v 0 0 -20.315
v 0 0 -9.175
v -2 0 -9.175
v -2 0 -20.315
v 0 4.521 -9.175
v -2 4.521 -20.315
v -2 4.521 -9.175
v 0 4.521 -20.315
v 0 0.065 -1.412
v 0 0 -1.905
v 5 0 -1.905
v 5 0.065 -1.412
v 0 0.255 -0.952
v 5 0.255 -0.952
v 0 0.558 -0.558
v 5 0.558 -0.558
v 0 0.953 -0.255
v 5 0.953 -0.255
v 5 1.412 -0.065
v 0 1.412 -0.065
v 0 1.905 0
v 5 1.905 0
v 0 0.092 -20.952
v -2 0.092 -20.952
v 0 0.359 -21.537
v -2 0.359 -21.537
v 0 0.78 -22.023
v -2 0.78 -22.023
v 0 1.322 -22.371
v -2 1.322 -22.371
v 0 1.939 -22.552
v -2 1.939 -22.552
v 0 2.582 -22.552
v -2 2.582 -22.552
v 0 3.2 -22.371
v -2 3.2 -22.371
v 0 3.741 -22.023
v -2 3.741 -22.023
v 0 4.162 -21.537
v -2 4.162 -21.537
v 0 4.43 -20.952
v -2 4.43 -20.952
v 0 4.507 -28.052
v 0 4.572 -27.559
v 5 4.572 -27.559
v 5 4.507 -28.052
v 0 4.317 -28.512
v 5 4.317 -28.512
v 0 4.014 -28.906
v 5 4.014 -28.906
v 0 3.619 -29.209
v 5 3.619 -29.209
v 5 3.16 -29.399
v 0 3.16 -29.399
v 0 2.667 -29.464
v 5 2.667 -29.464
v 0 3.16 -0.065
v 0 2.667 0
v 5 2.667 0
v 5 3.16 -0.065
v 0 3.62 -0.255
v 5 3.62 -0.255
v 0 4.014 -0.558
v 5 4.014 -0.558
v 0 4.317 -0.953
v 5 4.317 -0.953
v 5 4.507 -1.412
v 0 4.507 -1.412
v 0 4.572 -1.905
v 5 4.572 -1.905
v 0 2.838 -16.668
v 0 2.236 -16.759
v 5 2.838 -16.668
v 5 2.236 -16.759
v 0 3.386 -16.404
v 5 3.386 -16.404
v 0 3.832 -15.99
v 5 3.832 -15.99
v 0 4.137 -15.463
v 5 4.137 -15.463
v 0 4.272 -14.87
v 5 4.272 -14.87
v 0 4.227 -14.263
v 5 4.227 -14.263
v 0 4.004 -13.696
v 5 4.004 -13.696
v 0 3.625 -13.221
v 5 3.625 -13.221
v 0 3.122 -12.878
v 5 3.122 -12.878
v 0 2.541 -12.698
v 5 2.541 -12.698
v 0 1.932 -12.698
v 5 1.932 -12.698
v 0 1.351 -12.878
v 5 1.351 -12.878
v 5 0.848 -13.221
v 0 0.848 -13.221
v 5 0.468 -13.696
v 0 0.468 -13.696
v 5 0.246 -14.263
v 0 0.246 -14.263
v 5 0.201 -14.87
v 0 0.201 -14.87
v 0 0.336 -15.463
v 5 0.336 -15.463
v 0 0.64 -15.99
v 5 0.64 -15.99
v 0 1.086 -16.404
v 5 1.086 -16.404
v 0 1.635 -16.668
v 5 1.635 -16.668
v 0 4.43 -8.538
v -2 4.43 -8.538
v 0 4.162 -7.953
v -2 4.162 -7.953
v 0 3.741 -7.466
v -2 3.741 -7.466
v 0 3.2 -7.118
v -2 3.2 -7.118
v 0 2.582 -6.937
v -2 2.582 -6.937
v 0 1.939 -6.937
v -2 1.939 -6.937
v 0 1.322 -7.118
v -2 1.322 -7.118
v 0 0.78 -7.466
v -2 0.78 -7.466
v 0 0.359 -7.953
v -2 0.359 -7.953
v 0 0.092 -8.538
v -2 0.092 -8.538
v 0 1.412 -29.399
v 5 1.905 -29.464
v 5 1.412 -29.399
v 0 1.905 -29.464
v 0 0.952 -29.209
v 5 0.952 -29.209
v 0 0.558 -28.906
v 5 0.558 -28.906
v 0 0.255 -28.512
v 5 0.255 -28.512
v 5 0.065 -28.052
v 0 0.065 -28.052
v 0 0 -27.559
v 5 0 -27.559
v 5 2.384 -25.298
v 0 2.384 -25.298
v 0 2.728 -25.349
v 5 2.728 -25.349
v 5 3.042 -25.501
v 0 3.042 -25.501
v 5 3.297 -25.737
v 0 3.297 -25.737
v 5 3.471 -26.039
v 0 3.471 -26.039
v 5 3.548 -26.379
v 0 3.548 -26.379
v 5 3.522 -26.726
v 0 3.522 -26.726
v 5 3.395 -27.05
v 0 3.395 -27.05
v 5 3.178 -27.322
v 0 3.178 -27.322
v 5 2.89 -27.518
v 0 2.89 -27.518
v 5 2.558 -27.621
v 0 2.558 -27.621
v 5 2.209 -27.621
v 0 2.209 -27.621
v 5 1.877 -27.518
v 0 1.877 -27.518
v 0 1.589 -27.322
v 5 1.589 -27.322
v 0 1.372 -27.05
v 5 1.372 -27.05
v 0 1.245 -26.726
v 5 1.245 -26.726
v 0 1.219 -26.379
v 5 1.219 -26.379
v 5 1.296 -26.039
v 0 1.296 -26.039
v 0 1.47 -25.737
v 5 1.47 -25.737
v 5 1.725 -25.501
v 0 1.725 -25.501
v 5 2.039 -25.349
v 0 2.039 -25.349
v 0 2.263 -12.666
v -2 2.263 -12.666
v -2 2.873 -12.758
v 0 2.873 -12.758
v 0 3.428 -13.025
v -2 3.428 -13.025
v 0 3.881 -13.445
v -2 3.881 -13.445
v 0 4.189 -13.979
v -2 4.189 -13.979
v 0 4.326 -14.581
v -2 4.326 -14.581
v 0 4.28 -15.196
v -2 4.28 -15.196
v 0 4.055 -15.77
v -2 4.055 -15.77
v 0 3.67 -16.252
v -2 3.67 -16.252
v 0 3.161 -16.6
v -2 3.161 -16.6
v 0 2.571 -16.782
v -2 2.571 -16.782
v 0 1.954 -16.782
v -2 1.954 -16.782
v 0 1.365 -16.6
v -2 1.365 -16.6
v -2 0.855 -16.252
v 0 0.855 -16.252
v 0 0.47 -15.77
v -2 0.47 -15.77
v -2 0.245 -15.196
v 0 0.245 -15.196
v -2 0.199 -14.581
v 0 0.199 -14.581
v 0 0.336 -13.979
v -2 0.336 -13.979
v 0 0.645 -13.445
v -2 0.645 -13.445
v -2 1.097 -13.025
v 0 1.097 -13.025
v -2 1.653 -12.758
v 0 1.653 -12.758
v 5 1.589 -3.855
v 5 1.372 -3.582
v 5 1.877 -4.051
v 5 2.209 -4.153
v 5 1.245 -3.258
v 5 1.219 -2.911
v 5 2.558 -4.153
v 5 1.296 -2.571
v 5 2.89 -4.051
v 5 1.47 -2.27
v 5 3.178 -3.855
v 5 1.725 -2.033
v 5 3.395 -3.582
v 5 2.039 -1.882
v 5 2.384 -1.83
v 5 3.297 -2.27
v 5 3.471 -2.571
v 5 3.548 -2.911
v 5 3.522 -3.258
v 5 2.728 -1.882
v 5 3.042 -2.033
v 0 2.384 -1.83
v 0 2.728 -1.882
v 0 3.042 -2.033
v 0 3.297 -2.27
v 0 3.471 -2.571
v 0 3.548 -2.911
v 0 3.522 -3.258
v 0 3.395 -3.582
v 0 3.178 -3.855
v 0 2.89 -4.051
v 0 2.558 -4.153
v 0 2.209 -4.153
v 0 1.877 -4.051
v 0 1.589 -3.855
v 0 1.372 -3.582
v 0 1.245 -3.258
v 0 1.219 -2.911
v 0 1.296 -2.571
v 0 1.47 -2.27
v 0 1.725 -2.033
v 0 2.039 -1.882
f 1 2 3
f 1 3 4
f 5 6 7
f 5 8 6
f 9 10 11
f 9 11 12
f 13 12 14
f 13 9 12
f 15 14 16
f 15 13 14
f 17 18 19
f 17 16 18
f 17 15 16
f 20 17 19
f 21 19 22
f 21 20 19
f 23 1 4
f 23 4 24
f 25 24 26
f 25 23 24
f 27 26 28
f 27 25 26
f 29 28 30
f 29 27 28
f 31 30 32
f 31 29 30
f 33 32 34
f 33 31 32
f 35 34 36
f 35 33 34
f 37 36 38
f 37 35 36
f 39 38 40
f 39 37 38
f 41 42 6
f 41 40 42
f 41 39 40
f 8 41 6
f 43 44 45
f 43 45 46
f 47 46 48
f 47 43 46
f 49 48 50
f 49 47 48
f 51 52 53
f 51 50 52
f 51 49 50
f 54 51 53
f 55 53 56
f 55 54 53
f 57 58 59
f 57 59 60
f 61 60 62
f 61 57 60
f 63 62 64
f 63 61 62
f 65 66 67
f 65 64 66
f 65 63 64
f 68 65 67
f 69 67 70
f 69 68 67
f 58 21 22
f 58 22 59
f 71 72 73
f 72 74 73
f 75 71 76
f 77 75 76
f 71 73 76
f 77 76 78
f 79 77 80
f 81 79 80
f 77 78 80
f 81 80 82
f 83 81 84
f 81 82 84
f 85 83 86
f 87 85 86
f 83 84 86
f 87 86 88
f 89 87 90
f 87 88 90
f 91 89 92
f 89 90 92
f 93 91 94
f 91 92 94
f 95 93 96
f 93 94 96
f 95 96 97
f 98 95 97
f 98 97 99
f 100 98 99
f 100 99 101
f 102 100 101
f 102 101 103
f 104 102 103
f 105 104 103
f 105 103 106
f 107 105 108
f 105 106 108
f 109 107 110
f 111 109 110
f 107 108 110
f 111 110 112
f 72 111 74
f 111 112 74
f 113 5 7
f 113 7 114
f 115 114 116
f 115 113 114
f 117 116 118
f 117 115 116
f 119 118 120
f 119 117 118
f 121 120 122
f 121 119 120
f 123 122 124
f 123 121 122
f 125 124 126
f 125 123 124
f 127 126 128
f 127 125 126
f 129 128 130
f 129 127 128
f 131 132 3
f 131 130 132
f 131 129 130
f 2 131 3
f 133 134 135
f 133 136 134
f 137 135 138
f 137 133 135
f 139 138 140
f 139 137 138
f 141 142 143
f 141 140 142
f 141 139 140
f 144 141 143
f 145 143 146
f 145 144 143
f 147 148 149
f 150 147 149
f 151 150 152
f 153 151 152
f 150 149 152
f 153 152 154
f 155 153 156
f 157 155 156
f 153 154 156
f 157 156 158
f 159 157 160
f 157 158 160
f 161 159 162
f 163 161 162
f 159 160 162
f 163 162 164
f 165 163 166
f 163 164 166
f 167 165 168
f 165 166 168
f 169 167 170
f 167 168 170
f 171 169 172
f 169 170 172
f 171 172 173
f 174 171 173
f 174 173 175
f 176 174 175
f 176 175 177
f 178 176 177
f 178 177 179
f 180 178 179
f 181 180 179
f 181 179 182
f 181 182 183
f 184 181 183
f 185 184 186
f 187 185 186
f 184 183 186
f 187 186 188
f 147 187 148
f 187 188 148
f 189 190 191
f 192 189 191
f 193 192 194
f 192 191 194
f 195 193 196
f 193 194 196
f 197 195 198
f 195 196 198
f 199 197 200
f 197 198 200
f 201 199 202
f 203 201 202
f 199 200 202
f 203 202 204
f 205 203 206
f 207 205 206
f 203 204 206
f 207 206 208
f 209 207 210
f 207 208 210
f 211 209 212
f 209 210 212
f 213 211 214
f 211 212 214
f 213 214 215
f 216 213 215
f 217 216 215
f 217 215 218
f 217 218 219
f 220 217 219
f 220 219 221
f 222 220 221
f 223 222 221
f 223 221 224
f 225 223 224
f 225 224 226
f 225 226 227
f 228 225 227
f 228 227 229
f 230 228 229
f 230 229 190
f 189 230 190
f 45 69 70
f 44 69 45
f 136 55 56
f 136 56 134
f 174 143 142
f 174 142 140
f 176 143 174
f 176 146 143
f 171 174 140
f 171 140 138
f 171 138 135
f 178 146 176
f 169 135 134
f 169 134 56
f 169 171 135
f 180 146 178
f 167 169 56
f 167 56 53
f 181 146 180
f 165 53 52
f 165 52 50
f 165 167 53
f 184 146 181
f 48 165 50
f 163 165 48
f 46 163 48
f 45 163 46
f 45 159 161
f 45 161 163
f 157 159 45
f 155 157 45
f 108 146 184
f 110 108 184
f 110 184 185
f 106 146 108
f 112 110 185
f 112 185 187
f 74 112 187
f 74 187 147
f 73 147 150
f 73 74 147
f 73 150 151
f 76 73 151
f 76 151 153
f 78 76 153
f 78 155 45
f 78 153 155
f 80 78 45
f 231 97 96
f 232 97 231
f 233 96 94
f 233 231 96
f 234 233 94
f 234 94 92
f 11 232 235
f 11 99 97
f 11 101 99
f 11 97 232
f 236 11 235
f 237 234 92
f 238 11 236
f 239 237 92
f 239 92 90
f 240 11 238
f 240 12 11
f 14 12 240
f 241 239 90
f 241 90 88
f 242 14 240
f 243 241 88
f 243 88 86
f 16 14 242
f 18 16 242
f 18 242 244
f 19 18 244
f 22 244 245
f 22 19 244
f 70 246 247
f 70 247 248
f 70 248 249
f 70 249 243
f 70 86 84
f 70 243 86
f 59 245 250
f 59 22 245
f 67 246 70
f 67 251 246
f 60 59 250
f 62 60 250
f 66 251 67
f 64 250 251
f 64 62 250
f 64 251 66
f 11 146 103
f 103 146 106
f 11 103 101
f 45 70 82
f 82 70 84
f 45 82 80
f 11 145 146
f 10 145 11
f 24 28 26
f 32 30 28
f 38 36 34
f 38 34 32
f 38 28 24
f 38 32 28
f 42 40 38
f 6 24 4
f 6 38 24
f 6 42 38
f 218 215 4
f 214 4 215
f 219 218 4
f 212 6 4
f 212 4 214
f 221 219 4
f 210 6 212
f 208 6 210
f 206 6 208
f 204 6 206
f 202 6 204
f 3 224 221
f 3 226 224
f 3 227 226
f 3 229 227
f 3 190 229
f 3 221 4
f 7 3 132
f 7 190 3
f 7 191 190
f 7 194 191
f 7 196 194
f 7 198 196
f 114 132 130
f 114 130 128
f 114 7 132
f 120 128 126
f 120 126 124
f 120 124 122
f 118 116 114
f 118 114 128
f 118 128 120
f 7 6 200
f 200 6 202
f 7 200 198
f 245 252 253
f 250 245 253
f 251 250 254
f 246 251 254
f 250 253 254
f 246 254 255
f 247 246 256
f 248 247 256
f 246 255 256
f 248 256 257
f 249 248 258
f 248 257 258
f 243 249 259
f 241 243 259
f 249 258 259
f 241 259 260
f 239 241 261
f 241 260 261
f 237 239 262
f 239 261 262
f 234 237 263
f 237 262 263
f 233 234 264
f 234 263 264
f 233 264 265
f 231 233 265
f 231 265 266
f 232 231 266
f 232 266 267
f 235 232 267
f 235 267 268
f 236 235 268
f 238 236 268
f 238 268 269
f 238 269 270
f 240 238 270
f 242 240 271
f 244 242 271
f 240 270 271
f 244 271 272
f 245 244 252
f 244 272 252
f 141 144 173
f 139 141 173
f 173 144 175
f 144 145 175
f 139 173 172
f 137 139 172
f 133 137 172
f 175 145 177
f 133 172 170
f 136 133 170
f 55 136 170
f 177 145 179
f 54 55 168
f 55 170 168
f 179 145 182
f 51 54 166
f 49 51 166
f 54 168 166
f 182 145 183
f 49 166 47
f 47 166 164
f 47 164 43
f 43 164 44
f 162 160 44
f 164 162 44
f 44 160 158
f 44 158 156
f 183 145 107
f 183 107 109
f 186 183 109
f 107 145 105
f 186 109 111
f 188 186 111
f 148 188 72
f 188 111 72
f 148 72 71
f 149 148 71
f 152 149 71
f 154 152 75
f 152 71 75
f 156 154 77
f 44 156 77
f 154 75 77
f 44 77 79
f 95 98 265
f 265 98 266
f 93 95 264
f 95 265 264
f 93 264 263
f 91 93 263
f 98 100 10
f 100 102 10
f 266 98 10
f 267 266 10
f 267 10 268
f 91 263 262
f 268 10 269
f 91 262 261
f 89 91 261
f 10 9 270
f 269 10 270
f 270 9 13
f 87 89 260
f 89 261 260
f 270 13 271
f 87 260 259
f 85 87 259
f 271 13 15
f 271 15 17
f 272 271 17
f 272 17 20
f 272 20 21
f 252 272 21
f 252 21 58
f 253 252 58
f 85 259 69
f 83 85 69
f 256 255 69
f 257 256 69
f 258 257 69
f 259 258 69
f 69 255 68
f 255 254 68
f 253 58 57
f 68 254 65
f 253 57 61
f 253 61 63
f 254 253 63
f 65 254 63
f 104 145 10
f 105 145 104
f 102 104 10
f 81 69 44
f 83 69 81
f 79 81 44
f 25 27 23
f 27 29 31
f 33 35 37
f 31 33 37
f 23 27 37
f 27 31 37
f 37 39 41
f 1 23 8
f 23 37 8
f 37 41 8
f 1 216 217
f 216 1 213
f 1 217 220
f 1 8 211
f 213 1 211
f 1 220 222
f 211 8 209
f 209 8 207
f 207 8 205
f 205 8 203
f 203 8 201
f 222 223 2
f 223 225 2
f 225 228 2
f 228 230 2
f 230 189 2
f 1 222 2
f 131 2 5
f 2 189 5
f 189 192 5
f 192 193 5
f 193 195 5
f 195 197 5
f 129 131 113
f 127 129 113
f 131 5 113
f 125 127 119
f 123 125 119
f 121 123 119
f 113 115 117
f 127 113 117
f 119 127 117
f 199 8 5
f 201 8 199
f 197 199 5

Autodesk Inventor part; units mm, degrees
ref_plane "YZ Plane" through (0, 0, 0) normal (1, 0, 0) x (0, 1, 0)
ref_plane "XZ Plane" through (0, 0, 0) normal (0, 1, 0) x (-1, 0, 0)
ref_plane "XY Plane" through (0, 0, 0) normal (0, 0, 1) x (1, 0, 0)
sketch "Sketch1" plane through (0, 0, 0) normal (1, 0, 0) x (0, 1, 0)
  line L0 (1.905, 0) -> (2.667, 0)
  line L1 (4.572, -1.905) -> (4.572, -27.559)
  line L2 (2.667, -29.464) -> (1.905, -29.464)
  line L3 (0, -27.559) -> (0, -1.905)
  arc A0 (4.572, -1.905) -> (2.667, 0) centre (2.667, -1.905) ccw
  arc A1 (1.905, 0) -> (0, -1.905) centre (1.905, -1.905) ccw
  arc A2 (0, -27.559) -> (1.905, -29.464) centre (1.905, -27.559) ccw
  arc A3 (2.667, -29.464) -> (4.572, -27.559) centre (2.667, -27.559) ccw
  circle A4 centre (2.286, -14.732) radius 1.5367
  point P0 (0, 0)
  point P1 (4.572, -29.464)
  point P2 (4.572, 0)
  point P3 (0, -29.464)
  dimension "d0" = 4.572
  dimension "d1" = 29.464
  dimension "d2" = 1.905
  dimension "d3" = 3.0734
extrude "Extrusion1" add sketch "Sketch1" along normal blind 5
sketch "Sketch2" plane through (0, 0, 0) normal (-1, 0, 0) x (0, 0, 1)
  circle A0 centre (-26.4658, 2.3835) radius 1.1682
  line L0 (-27.559, 4.572) -> (-1.905, 4.572) projected
  line L1 (-1.905, 0) -> (-27.559, 0) projected
  circle A1 centre (-2.9982, 2.3835) radius 1.1682
  point P0 (0, 0)
extrude "Extrusion2" cut sketch "Sketch2" against normal through all
sketch "Sketch3" plane through (0, 0, 0) normal (-1, 0, 0) x (0, 0, 1)
  line L0 (-20.3149, 2.2606) -> (-9.1747, 2.2606) construction
  line L1 (-20.3149, 4.5212) -> (-9.1747, 4.5212)
  line L2 (-9.1747, 0) -> (-20.3149, 0)
  arc A0 (-20.3149, 4.5212) -> (-20.3149, 0) centre (-20.3149, 2.2606) ccw
  arc A1 (-9.1747, 0) -> (-9.1747, 4.5212) centre (-9.1747, 2.2606) ccw
  point P0 (0, 0)
  point P1 (-14.7448, 2.2606)
extrude "Extrusion3" add sketch "Sketch3" along normal blind 2 separate body
sketch "Sketch4" plane through (-2, 0, 0) normal (-1, 0, 0) x (0, 0, 1)
  circle A0 centre (-14.7356, 2.2845) radius 1.5229
  point P0 (0, 0)
extrude "Extrusion4" cut sketch "Sketch4" against normal blind 2 bodies 2
sketch "Sketch5" plane through (-2, 0, 0) normal (-1, 0, 0) x (0, 0, 1)
  circle A0 centre (-14.7354, 2.2627) radius 2.0695
  point P0 (0, 0)
extrude "Extrusion5" cut sketch "Sketch5" against normal through all bodies 2
sketch "Sketch6" plane through (5, 0, 0) normal (1, 0, 0) x (0, 0, -1)
  circle A0 centre (14.7171, 2.2363) radius 2.0415
  point P0 (0, 0)
extrude "Extrusion6" cut sketch "Sketch6" against normal through all bodies 1
properties part number "Fastener"
